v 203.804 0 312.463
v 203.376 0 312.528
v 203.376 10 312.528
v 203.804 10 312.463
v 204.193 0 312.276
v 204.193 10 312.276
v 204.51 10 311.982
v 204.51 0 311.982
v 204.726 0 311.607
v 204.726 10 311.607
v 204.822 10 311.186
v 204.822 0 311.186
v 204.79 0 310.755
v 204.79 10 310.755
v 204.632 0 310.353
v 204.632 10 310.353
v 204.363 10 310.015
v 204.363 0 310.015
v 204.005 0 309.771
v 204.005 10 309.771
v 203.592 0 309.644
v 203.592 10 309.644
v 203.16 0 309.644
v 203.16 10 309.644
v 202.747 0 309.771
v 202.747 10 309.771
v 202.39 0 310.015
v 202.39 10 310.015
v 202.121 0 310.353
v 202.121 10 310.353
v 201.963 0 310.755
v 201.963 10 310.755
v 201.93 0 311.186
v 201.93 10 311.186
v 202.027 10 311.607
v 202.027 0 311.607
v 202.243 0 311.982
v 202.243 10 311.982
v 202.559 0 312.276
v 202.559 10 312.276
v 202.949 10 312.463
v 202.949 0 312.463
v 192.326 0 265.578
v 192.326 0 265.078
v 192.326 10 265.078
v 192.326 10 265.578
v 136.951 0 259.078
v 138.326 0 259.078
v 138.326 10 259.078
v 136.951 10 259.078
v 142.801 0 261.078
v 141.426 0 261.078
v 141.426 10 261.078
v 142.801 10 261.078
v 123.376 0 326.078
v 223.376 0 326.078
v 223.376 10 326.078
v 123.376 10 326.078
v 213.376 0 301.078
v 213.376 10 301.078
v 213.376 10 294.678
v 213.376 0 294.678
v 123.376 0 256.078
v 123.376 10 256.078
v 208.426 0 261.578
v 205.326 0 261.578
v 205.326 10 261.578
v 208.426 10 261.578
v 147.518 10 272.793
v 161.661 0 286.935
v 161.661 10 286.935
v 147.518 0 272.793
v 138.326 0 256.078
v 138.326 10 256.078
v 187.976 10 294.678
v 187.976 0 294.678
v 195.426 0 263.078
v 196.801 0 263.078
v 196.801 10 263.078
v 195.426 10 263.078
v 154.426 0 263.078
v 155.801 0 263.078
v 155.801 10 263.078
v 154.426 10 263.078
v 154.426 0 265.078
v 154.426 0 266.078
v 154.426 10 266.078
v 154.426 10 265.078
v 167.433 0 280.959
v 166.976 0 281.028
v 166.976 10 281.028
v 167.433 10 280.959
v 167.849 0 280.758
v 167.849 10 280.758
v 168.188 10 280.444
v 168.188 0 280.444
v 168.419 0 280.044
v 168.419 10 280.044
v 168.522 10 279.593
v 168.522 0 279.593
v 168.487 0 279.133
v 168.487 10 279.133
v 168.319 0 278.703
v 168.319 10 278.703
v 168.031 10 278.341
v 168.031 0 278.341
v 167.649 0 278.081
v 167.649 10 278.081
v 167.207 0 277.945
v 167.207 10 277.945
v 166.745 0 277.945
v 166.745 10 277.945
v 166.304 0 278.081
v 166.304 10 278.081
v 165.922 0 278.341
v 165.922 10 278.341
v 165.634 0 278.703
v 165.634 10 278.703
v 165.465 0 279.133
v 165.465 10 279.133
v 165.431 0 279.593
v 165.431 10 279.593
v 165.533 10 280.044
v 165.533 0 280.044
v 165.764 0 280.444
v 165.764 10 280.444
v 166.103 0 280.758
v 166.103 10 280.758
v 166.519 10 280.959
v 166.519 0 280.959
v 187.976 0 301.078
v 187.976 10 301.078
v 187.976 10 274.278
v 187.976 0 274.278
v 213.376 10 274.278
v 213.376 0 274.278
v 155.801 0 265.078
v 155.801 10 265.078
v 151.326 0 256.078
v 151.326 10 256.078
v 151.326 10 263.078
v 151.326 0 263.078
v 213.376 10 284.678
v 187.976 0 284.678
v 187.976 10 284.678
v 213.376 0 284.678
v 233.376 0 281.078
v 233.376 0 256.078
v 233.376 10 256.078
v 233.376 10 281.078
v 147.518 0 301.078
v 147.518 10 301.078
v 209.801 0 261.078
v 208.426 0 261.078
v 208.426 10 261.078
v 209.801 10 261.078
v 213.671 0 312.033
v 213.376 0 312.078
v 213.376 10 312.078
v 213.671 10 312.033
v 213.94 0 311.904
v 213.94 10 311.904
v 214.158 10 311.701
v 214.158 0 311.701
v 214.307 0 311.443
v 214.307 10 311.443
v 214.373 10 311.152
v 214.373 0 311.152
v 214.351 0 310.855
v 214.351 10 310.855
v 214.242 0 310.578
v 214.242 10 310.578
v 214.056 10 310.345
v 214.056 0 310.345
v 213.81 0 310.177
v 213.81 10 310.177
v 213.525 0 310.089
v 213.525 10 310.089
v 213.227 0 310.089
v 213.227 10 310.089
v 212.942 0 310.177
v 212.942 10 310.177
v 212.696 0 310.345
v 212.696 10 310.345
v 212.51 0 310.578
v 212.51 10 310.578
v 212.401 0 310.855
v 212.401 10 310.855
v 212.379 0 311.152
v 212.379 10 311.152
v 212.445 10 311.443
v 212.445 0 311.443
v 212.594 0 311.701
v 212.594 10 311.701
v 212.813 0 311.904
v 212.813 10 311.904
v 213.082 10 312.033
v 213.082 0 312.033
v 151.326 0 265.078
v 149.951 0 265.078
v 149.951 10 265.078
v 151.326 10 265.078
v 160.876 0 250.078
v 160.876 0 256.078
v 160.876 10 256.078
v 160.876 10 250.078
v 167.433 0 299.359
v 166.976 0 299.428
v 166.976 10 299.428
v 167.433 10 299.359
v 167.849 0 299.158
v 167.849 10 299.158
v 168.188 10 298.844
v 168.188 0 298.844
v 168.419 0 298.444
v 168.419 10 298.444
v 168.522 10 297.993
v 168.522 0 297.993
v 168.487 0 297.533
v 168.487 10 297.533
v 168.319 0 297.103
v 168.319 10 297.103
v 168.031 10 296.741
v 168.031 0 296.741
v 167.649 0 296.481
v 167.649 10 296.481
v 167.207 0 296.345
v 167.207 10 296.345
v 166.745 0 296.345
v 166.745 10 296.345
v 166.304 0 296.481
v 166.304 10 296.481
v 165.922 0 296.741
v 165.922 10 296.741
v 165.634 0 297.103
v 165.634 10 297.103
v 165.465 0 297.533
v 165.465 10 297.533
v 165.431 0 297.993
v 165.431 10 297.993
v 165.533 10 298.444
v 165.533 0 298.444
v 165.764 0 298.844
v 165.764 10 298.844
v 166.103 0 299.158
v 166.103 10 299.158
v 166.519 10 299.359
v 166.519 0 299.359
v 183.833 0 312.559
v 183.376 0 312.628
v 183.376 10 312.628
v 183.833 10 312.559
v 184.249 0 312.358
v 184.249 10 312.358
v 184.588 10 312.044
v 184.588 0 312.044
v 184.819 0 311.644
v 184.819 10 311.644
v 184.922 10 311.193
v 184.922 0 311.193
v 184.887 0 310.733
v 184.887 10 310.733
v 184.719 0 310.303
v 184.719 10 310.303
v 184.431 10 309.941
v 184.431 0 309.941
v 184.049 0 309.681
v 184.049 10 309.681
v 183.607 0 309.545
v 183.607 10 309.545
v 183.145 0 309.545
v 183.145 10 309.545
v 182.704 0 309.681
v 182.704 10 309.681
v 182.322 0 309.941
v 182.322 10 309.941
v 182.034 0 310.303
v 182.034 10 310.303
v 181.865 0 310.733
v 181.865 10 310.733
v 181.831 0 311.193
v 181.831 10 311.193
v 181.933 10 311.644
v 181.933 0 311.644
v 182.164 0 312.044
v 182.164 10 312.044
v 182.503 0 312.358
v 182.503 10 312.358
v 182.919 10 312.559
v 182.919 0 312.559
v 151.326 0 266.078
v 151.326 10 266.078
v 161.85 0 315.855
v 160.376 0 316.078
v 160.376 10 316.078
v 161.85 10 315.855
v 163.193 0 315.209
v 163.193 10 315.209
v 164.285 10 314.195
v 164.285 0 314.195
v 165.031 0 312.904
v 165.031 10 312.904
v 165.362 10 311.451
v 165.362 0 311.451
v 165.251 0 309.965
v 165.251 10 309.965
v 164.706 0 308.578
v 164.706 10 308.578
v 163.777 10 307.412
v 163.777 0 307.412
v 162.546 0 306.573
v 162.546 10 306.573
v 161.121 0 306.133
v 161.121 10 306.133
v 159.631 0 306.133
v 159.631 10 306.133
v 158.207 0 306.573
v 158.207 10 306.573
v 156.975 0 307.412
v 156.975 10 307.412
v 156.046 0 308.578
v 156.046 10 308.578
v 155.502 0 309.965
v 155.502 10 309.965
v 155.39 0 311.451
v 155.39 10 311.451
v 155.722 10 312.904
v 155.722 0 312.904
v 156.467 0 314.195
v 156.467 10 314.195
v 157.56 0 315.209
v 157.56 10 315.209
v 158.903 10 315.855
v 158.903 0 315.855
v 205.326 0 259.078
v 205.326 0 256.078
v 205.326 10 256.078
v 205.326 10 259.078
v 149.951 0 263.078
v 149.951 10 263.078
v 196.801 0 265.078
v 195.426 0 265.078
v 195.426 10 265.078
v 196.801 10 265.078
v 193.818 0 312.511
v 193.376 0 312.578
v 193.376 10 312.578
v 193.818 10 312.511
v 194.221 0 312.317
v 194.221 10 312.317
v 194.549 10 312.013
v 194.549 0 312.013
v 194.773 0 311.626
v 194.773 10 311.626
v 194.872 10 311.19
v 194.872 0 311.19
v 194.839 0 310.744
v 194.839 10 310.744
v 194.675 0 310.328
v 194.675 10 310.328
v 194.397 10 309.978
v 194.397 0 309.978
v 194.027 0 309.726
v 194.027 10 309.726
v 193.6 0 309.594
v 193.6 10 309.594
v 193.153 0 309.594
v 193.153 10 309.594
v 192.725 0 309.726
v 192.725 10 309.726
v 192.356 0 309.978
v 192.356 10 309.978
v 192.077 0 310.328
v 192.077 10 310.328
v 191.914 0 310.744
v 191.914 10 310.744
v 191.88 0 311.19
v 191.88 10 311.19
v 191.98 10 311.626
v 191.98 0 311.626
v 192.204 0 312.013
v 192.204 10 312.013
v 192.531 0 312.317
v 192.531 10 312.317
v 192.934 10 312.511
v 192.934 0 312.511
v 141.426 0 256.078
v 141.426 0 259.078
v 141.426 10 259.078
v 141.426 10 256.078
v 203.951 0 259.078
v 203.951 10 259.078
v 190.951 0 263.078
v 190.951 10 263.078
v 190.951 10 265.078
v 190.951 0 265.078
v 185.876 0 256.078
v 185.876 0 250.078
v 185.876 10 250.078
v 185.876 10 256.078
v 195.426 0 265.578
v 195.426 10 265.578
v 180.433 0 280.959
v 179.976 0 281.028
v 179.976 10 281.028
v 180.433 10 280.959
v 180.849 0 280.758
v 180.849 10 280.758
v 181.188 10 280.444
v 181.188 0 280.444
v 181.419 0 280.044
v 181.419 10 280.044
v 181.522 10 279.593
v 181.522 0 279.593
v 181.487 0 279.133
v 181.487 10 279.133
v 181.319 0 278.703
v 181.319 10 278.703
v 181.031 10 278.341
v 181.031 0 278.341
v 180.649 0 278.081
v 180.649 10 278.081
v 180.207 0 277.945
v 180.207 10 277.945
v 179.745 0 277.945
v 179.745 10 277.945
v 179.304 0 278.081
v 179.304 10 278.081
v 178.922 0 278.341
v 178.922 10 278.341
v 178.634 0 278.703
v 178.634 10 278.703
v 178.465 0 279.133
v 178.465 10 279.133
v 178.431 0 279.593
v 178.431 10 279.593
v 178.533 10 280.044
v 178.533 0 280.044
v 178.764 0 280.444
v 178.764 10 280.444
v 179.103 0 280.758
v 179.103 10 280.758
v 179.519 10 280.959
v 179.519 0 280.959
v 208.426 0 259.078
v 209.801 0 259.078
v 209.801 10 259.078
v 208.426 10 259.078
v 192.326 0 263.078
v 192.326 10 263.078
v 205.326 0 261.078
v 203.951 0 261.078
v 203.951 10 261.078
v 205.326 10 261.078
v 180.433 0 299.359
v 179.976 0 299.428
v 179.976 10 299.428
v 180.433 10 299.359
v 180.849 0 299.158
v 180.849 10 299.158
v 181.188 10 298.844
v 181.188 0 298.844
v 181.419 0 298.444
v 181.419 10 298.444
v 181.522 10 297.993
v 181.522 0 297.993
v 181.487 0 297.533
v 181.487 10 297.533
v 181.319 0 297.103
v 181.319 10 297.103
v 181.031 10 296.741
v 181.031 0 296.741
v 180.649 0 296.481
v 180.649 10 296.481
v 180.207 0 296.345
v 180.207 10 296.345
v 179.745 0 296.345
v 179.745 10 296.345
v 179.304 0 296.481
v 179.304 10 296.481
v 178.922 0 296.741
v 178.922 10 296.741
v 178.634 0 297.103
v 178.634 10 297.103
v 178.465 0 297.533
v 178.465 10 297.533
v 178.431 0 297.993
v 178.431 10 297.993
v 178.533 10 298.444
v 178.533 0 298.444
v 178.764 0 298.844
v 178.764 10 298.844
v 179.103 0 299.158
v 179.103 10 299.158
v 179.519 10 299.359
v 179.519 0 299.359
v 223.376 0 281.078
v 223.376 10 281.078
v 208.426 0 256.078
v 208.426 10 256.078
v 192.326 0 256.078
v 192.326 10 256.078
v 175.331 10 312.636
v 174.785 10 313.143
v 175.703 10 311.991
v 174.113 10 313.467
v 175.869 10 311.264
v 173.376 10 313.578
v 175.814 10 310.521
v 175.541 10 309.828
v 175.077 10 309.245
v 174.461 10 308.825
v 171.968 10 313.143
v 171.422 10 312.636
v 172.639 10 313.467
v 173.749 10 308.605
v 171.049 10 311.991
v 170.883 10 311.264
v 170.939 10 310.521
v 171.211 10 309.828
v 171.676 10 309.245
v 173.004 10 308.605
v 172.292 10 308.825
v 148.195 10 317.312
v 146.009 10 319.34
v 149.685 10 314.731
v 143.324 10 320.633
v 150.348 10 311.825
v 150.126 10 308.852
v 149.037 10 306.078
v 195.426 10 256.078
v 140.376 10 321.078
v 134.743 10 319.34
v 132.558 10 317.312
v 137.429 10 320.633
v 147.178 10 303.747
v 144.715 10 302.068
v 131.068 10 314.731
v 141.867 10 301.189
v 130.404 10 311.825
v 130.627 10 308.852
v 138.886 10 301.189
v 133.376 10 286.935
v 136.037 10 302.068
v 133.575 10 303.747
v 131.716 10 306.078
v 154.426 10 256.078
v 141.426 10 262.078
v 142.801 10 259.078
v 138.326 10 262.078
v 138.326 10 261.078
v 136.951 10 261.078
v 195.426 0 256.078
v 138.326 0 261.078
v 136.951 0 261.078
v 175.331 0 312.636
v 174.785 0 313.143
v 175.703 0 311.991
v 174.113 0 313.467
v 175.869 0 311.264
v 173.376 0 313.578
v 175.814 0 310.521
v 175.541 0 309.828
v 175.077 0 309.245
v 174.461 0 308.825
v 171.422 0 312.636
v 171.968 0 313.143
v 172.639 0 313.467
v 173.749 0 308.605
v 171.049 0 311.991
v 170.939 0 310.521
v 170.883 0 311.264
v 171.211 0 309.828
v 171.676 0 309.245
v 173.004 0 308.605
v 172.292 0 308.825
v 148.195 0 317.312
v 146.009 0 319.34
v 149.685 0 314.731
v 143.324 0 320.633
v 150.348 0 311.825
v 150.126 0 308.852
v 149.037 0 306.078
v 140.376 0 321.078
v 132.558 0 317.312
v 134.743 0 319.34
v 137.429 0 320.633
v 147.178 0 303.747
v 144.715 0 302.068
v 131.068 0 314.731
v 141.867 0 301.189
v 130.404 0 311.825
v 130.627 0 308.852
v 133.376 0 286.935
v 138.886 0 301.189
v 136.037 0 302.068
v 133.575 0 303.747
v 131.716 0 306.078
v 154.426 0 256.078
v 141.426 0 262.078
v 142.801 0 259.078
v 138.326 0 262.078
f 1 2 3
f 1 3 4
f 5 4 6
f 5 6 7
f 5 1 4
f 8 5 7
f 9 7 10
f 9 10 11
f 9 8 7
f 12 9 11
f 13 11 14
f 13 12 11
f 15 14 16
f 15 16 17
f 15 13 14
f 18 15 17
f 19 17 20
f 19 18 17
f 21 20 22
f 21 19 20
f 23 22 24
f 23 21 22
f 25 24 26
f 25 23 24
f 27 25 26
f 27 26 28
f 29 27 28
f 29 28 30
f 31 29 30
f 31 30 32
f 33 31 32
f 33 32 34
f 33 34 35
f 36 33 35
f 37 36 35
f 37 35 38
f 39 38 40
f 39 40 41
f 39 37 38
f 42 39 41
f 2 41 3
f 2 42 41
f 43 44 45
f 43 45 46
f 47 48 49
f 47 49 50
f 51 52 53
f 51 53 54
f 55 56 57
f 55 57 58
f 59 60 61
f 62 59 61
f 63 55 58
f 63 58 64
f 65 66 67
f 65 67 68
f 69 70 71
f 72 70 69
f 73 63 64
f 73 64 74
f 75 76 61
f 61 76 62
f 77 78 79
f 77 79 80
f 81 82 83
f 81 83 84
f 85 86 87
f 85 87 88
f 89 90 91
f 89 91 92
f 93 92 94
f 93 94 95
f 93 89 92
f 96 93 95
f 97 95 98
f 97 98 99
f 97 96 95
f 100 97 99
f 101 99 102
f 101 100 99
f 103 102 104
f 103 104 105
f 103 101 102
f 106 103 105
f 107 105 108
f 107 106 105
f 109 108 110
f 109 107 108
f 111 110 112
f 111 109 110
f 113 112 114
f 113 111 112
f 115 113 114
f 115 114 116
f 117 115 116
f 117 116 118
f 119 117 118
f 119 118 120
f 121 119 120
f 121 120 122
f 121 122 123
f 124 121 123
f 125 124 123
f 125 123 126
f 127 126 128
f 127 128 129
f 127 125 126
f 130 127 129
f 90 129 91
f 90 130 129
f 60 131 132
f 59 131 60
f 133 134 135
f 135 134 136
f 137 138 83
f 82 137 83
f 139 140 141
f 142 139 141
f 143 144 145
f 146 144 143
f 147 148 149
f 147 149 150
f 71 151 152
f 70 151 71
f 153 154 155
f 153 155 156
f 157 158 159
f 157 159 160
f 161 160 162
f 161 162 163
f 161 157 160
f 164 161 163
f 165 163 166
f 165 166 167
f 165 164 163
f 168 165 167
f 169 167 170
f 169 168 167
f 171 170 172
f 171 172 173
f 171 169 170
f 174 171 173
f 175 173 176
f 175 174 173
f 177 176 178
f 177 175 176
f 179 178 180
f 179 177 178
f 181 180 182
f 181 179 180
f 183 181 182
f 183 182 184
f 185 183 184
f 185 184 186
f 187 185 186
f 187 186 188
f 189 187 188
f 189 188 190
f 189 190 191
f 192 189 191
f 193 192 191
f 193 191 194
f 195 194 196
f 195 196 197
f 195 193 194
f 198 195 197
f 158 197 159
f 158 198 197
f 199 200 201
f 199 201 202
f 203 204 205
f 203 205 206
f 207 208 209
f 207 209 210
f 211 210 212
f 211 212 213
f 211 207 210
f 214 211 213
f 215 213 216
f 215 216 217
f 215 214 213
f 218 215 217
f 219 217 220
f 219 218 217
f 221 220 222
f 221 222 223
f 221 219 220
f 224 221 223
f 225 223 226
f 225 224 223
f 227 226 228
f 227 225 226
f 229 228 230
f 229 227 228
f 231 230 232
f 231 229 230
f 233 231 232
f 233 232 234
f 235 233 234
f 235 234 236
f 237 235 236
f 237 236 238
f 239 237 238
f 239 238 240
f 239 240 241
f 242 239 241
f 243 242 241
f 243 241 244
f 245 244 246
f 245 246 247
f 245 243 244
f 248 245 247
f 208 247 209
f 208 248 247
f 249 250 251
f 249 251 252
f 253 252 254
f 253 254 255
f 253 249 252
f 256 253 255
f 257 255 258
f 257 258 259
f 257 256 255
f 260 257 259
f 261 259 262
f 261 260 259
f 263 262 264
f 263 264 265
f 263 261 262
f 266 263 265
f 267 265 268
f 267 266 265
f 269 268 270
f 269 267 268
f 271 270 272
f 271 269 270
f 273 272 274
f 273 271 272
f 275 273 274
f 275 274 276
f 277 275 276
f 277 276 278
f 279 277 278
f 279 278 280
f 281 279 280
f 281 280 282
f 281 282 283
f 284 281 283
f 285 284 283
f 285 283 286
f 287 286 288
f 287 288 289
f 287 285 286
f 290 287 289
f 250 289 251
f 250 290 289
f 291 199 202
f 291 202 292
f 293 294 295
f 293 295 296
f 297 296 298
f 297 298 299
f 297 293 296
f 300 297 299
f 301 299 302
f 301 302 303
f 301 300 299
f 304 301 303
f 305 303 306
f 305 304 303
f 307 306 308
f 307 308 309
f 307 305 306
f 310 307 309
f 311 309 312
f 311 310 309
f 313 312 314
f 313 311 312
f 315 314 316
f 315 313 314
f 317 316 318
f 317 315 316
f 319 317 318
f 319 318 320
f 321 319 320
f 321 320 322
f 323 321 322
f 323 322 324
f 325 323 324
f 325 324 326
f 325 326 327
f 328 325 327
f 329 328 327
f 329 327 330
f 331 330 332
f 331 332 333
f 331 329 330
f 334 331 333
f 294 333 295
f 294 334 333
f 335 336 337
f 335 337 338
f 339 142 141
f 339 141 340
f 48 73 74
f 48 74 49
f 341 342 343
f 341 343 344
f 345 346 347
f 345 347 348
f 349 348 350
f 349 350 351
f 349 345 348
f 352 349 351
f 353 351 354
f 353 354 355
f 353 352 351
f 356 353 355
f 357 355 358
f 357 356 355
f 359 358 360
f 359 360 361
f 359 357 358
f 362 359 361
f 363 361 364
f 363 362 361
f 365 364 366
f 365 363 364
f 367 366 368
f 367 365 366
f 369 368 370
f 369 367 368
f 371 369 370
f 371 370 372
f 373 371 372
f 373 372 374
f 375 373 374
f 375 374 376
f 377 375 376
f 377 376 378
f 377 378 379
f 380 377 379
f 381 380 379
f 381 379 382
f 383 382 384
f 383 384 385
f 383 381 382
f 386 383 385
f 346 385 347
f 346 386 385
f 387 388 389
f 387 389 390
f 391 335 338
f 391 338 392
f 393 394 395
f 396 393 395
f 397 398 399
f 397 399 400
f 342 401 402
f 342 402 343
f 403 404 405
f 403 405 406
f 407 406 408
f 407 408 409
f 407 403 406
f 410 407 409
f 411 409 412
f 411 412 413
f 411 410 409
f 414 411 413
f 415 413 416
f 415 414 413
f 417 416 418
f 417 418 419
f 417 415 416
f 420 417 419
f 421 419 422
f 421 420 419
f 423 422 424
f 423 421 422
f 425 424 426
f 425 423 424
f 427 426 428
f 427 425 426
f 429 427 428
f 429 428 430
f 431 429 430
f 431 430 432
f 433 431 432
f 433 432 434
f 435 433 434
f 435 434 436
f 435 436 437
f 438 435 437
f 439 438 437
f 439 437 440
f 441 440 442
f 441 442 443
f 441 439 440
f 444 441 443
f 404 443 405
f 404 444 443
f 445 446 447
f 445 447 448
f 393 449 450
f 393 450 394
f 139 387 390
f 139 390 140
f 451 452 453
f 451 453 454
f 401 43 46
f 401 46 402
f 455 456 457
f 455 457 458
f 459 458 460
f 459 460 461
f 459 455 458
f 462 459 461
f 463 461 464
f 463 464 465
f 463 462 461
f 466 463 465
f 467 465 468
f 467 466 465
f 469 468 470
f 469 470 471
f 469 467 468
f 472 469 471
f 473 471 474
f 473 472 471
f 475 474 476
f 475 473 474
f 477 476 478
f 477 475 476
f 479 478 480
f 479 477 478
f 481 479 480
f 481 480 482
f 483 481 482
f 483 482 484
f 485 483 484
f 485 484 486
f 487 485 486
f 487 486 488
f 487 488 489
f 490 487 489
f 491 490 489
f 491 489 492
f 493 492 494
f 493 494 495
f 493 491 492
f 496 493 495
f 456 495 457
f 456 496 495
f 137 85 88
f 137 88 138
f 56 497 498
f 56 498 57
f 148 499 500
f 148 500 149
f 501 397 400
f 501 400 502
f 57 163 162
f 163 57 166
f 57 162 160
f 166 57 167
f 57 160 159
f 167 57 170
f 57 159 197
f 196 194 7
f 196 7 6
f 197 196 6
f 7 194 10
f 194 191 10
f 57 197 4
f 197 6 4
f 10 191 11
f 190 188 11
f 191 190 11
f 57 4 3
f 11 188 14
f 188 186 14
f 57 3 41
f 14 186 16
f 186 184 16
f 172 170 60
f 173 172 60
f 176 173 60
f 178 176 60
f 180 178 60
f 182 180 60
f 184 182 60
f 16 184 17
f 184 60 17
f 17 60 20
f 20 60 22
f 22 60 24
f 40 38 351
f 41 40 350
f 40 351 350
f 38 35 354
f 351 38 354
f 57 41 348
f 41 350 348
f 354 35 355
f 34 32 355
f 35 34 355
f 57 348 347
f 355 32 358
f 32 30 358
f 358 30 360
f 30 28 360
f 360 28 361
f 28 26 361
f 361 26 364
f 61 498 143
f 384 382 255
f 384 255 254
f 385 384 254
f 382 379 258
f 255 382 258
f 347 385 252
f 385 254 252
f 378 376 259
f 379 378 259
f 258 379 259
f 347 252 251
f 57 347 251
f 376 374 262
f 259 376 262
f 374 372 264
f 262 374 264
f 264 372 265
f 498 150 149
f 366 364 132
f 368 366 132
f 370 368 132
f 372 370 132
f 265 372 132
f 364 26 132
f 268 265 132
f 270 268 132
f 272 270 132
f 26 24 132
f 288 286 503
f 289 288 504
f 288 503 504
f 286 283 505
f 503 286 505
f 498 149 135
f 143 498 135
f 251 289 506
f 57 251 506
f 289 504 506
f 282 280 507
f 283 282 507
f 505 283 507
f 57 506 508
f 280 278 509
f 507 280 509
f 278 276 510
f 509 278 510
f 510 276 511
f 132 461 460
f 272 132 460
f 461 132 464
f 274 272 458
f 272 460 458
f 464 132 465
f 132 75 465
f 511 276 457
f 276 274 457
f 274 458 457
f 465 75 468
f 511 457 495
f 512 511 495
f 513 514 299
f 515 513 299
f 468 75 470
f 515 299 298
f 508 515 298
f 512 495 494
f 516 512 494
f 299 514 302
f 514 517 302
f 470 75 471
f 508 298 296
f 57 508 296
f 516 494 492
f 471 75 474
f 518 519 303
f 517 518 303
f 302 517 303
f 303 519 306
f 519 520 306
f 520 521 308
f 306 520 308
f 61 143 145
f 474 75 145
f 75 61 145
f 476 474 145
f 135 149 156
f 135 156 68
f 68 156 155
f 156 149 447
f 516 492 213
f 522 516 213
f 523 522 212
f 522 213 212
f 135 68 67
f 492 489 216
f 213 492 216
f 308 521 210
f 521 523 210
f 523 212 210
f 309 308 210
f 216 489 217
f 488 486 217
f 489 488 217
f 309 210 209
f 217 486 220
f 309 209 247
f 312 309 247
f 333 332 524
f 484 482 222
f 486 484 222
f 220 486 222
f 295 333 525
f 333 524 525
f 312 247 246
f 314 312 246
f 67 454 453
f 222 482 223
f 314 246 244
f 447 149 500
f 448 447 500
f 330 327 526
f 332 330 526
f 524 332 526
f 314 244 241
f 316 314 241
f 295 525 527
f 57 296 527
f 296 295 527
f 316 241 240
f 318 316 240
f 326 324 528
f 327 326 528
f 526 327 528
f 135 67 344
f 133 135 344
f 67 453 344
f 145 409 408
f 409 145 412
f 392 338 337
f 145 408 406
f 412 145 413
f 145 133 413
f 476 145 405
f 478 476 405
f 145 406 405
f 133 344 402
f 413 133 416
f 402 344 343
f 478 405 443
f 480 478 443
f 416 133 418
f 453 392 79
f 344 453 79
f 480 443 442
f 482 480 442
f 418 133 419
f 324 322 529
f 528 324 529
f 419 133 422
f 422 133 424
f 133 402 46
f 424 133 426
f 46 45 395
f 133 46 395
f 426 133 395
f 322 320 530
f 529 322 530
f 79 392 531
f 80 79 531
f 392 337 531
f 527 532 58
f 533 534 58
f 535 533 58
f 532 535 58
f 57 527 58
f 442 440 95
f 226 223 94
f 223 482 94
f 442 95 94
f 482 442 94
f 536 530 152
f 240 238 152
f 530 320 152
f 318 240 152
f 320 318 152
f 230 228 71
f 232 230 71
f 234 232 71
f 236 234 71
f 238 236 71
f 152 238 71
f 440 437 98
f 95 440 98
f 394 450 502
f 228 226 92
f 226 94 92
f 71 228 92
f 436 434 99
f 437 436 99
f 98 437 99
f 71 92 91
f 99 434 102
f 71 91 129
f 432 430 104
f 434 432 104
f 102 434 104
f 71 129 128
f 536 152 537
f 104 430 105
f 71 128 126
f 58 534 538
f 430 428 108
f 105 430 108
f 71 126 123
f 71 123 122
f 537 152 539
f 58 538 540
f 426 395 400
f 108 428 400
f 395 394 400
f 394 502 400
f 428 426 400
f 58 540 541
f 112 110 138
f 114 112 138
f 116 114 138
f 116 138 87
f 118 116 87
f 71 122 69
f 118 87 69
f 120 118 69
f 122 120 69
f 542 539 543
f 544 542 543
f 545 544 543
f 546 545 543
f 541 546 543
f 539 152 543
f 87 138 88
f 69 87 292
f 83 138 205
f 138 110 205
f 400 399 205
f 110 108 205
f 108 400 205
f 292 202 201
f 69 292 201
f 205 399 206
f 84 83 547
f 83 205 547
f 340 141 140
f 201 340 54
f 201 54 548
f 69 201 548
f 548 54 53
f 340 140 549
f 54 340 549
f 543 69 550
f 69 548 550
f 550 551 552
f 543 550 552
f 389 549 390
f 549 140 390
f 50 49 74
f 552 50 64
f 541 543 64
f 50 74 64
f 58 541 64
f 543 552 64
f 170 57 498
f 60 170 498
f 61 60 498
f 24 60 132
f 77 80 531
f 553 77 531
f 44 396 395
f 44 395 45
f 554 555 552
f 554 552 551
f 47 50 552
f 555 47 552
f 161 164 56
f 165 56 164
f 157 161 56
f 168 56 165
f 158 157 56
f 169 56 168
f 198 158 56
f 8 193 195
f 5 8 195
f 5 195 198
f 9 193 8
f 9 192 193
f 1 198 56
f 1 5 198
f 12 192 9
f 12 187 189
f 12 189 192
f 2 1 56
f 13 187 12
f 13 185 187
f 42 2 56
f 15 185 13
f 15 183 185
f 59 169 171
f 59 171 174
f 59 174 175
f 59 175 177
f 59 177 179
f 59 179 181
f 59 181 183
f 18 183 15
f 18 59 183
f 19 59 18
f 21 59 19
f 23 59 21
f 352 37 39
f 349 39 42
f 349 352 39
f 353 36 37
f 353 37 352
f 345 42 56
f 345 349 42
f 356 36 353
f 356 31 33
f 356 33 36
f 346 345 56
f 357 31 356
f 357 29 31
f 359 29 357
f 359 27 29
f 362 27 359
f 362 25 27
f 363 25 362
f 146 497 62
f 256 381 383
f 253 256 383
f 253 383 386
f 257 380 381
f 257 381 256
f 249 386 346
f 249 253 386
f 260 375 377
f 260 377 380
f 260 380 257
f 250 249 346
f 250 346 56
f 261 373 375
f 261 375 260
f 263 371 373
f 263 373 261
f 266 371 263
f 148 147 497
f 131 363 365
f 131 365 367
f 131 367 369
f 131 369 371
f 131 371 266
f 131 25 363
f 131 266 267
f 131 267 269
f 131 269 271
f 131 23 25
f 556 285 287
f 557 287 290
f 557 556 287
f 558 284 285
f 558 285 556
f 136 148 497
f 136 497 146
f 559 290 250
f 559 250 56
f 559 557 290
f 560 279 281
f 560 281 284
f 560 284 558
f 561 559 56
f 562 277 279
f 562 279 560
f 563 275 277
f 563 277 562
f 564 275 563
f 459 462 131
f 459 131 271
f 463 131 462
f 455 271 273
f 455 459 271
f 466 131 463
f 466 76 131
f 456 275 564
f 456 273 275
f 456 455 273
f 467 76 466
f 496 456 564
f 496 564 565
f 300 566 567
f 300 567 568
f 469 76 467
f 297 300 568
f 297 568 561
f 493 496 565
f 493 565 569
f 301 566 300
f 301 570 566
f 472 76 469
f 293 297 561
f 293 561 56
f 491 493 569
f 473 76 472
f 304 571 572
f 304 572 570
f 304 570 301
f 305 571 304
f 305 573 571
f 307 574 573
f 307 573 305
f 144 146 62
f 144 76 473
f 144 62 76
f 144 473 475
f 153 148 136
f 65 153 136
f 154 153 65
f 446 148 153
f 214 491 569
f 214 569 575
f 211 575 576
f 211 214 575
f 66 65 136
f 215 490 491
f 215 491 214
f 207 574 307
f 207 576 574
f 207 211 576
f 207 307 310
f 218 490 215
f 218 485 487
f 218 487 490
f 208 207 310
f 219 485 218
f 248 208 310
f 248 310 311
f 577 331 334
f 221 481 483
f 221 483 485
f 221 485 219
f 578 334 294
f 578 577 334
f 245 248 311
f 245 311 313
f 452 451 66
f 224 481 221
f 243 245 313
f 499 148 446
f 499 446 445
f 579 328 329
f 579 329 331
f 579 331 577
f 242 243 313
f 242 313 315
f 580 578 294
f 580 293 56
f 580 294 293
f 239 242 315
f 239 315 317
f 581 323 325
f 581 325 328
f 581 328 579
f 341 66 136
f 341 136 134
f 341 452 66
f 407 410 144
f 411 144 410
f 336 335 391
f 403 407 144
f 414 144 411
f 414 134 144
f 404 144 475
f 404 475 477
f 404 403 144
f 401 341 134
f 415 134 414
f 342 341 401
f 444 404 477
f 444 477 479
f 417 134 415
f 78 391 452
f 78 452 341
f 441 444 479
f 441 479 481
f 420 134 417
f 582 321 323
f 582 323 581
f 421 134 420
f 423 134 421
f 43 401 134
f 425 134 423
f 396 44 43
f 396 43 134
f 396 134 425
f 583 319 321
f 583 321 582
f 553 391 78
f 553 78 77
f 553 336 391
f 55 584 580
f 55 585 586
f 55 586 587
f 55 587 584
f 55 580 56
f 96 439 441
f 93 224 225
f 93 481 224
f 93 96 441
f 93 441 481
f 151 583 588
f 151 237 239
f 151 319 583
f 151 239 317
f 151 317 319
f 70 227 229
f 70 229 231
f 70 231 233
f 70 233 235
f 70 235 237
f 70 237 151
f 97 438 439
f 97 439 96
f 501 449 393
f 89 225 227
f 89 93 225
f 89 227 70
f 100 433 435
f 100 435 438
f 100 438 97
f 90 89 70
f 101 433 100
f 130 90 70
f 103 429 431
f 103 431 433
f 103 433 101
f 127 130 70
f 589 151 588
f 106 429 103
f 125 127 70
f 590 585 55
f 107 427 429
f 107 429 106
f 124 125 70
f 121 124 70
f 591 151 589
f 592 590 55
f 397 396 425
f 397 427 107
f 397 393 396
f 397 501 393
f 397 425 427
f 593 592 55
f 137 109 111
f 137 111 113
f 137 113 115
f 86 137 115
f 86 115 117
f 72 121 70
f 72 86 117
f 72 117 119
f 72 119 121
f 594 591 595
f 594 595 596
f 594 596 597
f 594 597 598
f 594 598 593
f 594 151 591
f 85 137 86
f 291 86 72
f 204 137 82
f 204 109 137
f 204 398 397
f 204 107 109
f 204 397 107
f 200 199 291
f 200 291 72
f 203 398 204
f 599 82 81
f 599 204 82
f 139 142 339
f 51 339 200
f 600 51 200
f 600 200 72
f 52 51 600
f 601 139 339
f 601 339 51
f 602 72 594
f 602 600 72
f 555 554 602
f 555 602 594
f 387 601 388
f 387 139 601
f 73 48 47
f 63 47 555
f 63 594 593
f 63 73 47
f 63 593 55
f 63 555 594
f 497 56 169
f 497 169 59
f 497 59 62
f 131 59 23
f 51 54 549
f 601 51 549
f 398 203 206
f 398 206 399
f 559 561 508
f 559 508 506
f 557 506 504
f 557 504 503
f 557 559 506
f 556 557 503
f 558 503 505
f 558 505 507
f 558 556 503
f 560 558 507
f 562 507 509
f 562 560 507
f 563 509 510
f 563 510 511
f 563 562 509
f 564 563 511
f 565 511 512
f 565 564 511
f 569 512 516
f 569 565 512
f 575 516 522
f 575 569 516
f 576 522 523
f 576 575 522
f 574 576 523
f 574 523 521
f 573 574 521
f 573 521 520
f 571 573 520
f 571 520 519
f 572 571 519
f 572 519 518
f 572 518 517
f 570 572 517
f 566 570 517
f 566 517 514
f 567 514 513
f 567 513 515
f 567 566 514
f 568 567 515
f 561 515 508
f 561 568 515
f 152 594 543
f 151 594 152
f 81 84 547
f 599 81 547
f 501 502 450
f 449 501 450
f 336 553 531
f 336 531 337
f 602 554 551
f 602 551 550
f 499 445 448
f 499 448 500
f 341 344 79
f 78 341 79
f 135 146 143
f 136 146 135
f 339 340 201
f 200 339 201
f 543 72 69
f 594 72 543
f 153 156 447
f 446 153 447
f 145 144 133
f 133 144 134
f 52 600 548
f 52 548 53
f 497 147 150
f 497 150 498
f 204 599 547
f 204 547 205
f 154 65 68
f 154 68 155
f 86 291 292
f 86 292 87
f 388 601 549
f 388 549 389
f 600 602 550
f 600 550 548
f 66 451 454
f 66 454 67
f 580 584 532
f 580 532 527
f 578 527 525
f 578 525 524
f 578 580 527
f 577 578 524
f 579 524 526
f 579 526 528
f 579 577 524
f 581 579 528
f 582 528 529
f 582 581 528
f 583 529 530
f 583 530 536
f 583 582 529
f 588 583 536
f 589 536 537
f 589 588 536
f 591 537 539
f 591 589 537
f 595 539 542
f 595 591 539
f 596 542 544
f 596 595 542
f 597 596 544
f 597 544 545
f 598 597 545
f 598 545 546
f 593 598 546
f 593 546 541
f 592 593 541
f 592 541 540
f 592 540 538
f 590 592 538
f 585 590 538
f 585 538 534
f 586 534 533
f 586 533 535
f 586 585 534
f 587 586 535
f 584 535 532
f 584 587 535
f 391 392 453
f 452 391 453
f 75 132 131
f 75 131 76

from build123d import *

# Parameters (mm, degrees)
SZKIC1_R                    = 1
SZKIC1_R_2                  = 1.5
SZKIC1_R_3                  = 1.55
SZKIC1_R_4                  = 2.5
SZKIC1_R_5                  = 5
SZKIC1_R_6                  = 10
SZKIC1_R_7                  = 1.45
SZKIC1_W                    = 25.4
SZKIC1_H                    = 6.4
SZKIC1_H_2                  = 10.4
DODANIE_WYCI_GNI_CIE1_DEPTH = 10


with BuildPart() as part:
    # Szkic1 → Dodanie-wyciągnięcie1 (new body)
    with BuildSketch(Plane(origin=(0, 0, 0), x_dir=(1, 0, 0), z_dir=(0, 1, 0))):
        Polygon((208.426283919, -256.077576053), (233.376283919, -256.077576053), (233.376283919, -281.077576053), (223.376283919, -281.077576053), (223.376283919, -326.077576053), (123.376283919, -326.077576053), (123.376283919, -256.077576053), (138.326283919, -256.077576053), (138.326283919, -259.077576053), (136.951283919, -259.077576053), (136.951283919, -261.077576053), (138.326283919, -261.077576053), (138.326283919, -262.077576053), (141.426283919, -262.077576053), (141.426283919, -261.077576053), (142.801283919, -261.077576053), (142.801283919, -259.077576053), (141.426283919, -259.077576053), (141.426283919, -256.077576053), (151.326283919, -256.077576053), (151.326283919, -263.077576053), (149.951283919, -263.077576053), (149.951283919, -265.077576053), (151.326283919, -265.077576053), (151.326283919, -266.077576053), (154.426283919, -266.077576053), (154.426283919, -265.077576053), (155.801283919, -265.077576053), (155.801283919, -263.077576053), (154.426283919, -263.077576053), (154.426283919, -256.077576053), (160.876283919, -256.077576053), (160.876283919, -250.077576053), (185.876283919, -250.077576053), (185.876283919, -256.077576053), (192.326283919, -256.077576053), (192.326283919, -263.077576053), (190.951283919, -263.077576053), (190.951283919, -265.077576053), (192.326283919, -265.077576053), (192.326283919, -265.577576053), (195.426283919, -265.577576053), (195.426283919, -265.077576053), (196.801283919, -265.077576053), (196.801283919, -263.077576053), (195.426283919, -263.077576053), (195.426283919, -256.077576053), (205.326283919, -256.077576053), (205.326283919, -259.077576053), (203.951283919, -259.077576053), (203.951283919, -261.077576053), (205.326283919, -261.077576053), (205.326283919, -261.577576053), (208.426283919, -261.577576053), (208.426283919, -261.077576053), (209.801283919, -261.077576053), (209.801283919, -259.077576053), (208.426283919, -259.077576053), align=None)
        with Locations(Location((213.376283919, -311.077576053, 0), (0, 0, 270))):
            Circle(SZKIC1_R, mode=Mode.SUBTRACT)
        with Locations(Location((193.376283919, -311.077576053, 0), (0, 0, 270))):
            Circle(SZKIC1_R_2, mode=Mode.SUBTRACT)
        with Locations(Location((183.376283919, -311.077576053, 0), (0, 0, 270))):
            Circle(SZKIC1_R_3, mode=Mode.SUBTRACT)
        with Locations(Location((173.376283919, -311.077576053, 0), (0, 0, 270))):
            Circle(SZKIC1_R_4, mode=Mode.SUBTRACT)
        with Locations(Location((160.376283919, -311.077576053, 0), (0, 0, 270))):
            Circle(SZKIC1_R_5, mode=Mode.SUBTRACT)
        with Locations(Location((140.376283919, -311.077576053, 0), (0, 0, 270))):
            Circle(SZKIC1_R_6, mode=Mode.SUBTRACT)
        with Locations(Location((179.976283919, -279.477576053, 0), (0, 0, 270))):
            Circle(SZKIC1_R_3, mode=Mode.SUBTRACT)
        with Locations(Location((166.976283919, -279.477576053, 0), (0, 0, 270))):
            Circle(SZKIC1_R_3, mode=Mode.SUBTRACT)
        with Locations(Location((179.976283919, -297.877576053, 0), (0, 0, 270))):
            Circle(SZKIC1_R_3, mode=Mode.SUBTRACT)
        with Locations(Location((166.976283919, -297.877576053, 0), (0, 0, 270))):
            Circle(SZKIC1_R_3, mode=Mode.SUBTRACT)
        with Locations(Location((203.376283919, -311.077576053, 0), (0, 0, 270))):
            Circle(SZKIC1_R_7, mode=Mode.SUBTRACT)
        with Locations((200.676283919, -297.877576053)):
            Rectangle(SZKIC1_W, SZKIC1_H, mode=Mode.SUBTRACT)
        with Locations((200.676283919, -279.477576053)):
            Rectangle(SZKIC1_W, SZKIC1_H_2, mode=Mode.SUBTRACT)
        Polygon((161.660555166, -286.935440429), (147.518419543, -272.793304805), (133.376283919, -286.935440429), (147.518419543, -301.077576053), align=None, mode=Mode.SUBTRACT)
    extrude(amount=DODANIE_WYCI_GNI_CIE1_DEPTH)


solid = part.part
